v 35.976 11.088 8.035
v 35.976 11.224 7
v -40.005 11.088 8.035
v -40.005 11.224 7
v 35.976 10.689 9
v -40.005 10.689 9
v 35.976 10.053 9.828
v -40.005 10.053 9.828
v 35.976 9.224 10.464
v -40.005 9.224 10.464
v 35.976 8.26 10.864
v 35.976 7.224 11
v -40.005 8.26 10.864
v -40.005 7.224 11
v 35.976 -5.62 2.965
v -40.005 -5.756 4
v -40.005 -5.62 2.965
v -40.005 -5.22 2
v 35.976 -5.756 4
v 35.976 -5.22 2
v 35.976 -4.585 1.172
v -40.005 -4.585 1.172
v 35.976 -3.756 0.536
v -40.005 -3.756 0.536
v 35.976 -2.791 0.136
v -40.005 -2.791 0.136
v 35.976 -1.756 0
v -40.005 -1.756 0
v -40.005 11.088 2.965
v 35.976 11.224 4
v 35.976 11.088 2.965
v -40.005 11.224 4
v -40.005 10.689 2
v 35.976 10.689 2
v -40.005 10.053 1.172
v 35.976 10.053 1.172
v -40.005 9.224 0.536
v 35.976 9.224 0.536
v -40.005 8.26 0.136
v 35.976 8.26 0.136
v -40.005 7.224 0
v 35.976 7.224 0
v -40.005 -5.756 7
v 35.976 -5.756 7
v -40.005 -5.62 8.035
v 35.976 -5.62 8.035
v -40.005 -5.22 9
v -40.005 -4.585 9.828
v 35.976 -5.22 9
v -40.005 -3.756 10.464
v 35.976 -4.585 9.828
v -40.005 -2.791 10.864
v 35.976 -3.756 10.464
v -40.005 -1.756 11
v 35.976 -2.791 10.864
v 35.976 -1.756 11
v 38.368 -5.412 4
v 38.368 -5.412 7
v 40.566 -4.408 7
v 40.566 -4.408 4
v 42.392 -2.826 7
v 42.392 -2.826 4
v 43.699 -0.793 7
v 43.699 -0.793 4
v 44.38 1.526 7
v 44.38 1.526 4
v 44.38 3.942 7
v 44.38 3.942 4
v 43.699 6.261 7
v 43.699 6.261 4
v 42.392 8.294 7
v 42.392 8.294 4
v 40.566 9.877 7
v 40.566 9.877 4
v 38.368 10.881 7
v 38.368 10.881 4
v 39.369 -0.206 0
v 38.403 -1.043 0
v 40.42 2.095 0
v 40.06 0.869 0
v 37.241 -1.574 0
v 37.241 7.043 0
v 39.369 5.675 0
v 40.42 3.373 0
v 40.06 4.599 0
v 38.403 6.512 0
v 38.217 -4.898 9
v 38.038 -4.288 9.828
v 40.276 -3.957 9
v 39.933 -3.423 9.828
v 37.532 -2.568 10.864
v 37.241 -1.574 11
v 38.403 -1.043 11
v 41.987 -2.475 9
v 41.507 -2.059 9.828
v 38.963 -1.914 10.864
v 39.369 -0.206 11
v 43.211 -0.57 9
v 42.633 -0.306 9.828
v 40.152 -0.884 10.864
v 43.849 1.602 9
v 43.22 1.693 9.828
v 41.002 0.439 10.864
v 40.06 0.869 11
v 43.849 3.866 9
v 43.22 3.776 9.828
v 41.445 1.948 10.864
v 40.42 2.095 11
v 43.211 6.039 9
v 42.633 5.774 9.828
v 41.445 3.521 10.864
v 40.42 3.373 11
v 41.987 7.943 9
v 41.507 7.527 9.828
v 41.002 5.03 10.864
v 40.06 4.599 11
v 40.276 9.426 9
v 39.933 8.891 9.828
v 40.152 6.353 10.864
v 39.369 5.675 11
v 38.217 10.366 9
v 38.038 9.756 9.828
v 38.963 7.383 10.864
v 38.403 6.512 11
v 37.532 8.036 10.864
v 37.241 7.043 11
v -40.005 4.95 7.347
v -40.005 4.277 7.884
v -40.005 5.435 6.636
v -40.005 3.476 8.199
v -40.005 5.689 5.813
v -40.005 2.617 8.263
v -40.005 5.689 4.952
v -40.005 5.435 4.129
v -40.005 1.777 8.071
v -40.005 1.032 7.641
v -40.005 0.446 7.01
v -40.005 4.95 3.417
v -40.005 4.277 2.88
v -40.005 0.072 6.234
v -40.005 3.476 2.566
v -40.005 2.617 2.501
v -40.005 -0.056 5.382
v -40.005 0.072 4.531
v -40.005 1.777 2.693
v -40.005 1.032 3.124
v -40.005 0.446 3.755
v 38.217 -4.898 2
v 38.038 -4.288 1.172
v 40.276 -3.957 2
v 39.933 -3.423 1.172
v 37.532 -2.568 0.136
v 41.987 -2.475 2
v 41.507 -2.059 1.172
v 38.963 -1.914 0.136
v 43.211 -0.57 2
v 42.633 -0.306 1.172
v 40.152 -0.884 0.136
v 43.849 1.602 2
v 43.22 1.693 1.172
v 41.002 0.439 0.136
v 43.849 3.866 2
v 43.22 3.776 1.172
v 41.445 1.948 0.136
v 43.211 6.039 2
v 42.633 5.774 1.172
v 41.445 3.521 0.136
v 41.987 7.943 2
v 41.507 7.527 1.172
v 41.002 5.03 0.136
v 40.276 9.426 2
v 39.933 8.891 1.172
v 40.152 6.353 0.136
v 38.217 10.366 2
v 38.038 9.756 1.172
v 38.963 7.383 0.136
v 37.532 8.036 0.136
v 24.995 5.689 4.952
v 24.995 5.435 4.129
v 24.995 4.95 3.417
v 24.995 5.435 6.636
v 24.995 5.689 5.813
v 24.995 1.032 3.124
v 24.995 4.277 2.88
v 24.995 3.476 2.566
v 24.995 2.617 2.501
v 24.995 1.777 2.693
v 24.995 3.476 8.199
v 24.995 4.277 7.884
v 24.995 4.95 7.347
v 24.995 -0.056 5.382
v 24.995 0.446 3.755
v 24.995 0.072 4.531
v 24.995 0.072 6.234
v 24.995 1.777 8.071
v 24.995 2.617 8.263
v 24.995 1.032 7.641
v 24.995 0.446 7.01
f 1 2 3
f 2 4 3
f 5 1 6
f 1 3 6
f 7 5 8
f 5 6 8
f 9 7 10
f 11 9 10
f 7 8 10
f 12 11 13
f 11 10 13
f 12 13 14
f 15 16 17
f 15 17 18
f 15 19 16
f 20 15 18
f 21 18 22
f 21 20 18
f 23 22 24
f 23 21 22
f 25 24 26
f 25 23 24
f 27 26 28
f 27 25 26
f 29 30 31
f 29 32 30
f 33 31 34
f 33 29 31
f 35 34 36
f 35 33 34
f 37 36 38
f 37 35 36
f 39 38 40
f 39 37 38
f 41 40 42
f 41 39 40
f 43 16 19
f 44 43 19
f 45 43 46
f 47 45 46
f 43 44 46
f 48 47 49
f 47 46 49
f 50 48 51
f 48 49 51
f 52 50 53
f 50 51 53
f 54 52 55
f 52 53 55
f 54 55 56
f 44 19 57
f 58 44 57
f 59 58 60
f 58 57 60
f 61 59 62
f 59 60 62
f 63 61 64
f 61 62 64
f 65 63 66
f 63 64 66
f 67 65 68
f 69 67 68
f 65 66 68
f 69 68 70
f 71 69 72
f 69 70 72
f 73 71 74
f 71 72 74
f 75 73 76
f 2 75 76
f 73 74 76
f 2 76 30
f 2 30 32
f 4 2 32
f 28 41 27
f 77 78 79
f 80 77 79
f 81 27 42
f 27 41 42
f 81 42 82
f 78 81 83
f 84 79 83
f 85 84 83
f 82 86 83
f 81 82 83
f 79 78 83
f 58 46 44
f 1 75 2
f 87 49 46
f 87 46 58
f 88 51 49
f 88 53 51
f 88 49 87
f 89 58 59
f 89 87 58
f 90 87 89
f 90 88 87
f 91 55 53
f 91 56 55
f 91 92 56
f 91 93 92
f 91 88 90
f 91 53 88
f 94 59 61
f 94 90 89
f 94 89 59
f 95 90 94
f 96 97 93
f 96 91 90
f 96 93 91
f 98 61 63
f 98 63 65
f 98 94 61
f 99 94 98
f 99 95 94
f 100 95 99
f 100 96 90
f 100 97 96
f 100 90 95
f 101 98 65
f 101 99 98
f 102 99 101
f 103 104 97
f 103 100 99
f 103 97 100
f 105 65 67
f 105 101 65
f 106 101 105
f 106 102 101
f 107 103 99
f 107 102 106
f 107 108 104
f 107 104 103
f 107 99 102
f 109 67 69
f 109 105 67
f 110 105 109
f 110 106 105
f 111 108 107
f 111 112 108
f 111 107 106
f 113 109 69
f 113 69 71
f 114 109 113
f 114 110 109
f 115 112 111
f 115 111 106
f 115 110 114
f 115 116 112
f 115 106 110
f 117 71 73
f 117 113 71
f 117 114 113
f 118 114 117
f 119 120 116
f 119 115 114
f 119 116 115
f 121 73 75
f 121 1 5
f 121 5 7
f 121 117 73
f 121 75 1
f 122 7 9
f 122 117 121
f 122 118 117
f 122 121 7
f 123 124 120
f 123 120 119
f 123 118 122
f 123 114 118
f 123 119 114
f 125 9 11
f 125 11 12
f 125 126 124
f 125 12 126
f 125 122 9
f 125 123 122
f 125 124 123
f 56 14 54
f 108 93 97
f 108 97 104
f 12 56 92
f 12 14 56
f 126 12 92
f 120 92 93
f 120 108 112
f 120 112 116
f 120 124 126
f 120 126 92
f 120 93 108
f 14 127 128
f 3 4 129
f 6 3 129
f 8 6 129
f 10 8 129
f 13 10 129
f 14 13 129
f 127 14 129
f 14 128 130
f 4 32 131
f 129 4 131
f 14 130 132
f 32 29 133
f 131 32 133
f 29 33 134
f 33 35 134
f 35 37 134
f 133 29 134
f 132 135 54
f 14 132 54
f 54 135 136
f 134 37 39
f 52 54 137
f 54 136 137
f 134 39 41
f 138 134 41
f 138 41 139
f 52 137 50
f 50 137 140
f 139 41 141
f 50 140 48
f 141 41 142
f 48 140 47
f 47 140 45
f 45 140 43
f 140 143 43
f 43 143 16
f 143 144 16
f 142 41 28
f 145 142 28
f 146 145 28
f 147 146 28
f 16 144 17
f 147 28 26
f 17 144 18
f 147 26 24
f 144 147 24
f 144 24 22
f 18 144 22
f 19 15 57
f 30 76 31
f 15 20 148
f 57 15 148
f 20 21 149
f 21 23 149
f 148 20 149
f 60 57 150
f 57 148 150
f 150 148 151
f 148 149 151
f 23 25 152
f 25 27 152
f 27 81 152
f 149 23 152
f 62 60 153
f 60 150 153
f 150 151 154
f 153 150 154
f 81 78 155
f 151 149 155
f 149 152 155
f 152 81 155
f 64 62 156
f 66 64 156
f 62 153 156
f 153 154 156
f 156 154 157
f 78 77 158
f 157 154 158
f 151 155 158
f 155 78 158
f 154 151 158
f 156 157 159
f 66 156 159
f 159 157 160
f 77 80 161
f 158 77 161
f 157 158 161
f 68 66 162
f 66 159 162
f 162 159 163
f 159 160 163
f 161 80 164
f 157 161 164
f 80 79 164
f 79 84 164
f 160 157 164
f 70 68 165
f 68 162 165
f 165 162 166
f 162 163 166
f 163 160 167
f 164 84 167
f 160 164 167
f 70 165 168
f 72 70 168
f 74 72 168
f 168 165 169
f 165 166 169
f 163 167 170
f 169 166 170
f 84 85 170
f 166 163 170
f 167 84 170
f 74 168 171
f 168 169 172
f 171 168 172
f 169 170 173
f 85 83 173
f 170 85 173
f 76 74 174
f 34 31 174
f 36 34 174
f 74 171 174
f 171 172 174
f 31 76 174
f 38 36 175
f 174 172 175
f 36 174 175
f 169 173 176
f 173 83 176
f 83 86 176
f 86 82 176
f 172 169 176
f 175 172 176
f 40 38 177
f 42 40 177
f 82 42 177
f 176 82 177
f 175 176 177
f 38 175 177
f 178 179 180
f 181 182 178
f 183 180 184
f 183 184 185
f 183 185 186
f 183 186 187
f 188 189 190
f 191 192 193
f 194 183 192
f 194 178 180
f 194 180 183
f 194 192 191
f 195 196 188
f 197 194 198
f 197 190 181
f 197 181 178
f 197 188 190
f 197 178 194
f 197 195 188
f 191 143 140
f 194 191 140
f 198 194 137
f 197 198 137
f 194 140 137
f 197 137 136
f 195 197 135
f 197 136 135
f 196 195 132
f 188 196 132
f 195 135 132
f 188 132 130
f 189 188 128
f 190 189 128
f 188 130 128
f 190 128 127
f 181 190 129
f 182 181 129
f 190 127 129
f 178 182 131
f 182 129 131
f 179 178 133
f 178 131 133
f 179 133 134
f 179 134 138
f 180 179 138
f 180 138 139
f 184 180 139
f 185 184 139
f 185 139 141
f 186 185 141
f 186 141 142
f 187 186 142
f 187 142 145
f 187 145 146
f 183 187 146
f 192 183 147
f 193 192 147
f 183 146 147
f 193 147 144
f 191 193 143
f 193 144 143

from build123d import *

# Parameters (mm, degrees)
F1_DEPTH = 11
F2_R     = 4
F3_R     = 4
F4_R     = 2.888832
F5_DEPTH = 65


with BuildPart() as f1:
    # F0 (on Top) → F1 (new body)
    with BuildSketch(Plane.XY):
        with BuildLine():
            Line((35.975721, 11.224424), (-40.004998, 11.224424))
            Line((-40.004998, 11.224424), (-40.004998, -5.756116))
            Line((-40.004998, -5.756116), (35.975721, -5.756116))
            ThreePointArc((35.975721, -5.756116), (44.465991, 2.734154), (35.975721, 11.224424))
        make_face()
    extrude(amount=F1_DEPTH)

    # F2
    f2_edges = [f1.edges().sort_by_distance(p)[0] for p in [
        (-2.014639, -5.756116, 11),
        (44.465991, 2.734154, 11),
        (-2.014639, 11.224424, 11),
    ]]
    fillet(f2_edges, radius=F2_R)

    # F3
    f3_edges = [f1.edges().sort_by_distance(p)[0] for p in [
        (-2.014639, 11.224424, 0),
        (-2.014639, -5.756116, 0),
        (44.465991, 2.734154, 0),
    ]]
    fillet(f3_edges, radius=F3_R)

    # F4 (on face) → F5 (cut)
    with BuildSketch(Plane(origin=(-40.004998, 0, 0), x_dir=(0, -1, 0), z_dir=(-1, 0, 0))):
        with Locations((-2.832736, 5.382194)):
            Circle(F4_R)
    extrude(amount=-F5_DEPTH, mode=Mode.SUBTRACT)


solid = f1.part
